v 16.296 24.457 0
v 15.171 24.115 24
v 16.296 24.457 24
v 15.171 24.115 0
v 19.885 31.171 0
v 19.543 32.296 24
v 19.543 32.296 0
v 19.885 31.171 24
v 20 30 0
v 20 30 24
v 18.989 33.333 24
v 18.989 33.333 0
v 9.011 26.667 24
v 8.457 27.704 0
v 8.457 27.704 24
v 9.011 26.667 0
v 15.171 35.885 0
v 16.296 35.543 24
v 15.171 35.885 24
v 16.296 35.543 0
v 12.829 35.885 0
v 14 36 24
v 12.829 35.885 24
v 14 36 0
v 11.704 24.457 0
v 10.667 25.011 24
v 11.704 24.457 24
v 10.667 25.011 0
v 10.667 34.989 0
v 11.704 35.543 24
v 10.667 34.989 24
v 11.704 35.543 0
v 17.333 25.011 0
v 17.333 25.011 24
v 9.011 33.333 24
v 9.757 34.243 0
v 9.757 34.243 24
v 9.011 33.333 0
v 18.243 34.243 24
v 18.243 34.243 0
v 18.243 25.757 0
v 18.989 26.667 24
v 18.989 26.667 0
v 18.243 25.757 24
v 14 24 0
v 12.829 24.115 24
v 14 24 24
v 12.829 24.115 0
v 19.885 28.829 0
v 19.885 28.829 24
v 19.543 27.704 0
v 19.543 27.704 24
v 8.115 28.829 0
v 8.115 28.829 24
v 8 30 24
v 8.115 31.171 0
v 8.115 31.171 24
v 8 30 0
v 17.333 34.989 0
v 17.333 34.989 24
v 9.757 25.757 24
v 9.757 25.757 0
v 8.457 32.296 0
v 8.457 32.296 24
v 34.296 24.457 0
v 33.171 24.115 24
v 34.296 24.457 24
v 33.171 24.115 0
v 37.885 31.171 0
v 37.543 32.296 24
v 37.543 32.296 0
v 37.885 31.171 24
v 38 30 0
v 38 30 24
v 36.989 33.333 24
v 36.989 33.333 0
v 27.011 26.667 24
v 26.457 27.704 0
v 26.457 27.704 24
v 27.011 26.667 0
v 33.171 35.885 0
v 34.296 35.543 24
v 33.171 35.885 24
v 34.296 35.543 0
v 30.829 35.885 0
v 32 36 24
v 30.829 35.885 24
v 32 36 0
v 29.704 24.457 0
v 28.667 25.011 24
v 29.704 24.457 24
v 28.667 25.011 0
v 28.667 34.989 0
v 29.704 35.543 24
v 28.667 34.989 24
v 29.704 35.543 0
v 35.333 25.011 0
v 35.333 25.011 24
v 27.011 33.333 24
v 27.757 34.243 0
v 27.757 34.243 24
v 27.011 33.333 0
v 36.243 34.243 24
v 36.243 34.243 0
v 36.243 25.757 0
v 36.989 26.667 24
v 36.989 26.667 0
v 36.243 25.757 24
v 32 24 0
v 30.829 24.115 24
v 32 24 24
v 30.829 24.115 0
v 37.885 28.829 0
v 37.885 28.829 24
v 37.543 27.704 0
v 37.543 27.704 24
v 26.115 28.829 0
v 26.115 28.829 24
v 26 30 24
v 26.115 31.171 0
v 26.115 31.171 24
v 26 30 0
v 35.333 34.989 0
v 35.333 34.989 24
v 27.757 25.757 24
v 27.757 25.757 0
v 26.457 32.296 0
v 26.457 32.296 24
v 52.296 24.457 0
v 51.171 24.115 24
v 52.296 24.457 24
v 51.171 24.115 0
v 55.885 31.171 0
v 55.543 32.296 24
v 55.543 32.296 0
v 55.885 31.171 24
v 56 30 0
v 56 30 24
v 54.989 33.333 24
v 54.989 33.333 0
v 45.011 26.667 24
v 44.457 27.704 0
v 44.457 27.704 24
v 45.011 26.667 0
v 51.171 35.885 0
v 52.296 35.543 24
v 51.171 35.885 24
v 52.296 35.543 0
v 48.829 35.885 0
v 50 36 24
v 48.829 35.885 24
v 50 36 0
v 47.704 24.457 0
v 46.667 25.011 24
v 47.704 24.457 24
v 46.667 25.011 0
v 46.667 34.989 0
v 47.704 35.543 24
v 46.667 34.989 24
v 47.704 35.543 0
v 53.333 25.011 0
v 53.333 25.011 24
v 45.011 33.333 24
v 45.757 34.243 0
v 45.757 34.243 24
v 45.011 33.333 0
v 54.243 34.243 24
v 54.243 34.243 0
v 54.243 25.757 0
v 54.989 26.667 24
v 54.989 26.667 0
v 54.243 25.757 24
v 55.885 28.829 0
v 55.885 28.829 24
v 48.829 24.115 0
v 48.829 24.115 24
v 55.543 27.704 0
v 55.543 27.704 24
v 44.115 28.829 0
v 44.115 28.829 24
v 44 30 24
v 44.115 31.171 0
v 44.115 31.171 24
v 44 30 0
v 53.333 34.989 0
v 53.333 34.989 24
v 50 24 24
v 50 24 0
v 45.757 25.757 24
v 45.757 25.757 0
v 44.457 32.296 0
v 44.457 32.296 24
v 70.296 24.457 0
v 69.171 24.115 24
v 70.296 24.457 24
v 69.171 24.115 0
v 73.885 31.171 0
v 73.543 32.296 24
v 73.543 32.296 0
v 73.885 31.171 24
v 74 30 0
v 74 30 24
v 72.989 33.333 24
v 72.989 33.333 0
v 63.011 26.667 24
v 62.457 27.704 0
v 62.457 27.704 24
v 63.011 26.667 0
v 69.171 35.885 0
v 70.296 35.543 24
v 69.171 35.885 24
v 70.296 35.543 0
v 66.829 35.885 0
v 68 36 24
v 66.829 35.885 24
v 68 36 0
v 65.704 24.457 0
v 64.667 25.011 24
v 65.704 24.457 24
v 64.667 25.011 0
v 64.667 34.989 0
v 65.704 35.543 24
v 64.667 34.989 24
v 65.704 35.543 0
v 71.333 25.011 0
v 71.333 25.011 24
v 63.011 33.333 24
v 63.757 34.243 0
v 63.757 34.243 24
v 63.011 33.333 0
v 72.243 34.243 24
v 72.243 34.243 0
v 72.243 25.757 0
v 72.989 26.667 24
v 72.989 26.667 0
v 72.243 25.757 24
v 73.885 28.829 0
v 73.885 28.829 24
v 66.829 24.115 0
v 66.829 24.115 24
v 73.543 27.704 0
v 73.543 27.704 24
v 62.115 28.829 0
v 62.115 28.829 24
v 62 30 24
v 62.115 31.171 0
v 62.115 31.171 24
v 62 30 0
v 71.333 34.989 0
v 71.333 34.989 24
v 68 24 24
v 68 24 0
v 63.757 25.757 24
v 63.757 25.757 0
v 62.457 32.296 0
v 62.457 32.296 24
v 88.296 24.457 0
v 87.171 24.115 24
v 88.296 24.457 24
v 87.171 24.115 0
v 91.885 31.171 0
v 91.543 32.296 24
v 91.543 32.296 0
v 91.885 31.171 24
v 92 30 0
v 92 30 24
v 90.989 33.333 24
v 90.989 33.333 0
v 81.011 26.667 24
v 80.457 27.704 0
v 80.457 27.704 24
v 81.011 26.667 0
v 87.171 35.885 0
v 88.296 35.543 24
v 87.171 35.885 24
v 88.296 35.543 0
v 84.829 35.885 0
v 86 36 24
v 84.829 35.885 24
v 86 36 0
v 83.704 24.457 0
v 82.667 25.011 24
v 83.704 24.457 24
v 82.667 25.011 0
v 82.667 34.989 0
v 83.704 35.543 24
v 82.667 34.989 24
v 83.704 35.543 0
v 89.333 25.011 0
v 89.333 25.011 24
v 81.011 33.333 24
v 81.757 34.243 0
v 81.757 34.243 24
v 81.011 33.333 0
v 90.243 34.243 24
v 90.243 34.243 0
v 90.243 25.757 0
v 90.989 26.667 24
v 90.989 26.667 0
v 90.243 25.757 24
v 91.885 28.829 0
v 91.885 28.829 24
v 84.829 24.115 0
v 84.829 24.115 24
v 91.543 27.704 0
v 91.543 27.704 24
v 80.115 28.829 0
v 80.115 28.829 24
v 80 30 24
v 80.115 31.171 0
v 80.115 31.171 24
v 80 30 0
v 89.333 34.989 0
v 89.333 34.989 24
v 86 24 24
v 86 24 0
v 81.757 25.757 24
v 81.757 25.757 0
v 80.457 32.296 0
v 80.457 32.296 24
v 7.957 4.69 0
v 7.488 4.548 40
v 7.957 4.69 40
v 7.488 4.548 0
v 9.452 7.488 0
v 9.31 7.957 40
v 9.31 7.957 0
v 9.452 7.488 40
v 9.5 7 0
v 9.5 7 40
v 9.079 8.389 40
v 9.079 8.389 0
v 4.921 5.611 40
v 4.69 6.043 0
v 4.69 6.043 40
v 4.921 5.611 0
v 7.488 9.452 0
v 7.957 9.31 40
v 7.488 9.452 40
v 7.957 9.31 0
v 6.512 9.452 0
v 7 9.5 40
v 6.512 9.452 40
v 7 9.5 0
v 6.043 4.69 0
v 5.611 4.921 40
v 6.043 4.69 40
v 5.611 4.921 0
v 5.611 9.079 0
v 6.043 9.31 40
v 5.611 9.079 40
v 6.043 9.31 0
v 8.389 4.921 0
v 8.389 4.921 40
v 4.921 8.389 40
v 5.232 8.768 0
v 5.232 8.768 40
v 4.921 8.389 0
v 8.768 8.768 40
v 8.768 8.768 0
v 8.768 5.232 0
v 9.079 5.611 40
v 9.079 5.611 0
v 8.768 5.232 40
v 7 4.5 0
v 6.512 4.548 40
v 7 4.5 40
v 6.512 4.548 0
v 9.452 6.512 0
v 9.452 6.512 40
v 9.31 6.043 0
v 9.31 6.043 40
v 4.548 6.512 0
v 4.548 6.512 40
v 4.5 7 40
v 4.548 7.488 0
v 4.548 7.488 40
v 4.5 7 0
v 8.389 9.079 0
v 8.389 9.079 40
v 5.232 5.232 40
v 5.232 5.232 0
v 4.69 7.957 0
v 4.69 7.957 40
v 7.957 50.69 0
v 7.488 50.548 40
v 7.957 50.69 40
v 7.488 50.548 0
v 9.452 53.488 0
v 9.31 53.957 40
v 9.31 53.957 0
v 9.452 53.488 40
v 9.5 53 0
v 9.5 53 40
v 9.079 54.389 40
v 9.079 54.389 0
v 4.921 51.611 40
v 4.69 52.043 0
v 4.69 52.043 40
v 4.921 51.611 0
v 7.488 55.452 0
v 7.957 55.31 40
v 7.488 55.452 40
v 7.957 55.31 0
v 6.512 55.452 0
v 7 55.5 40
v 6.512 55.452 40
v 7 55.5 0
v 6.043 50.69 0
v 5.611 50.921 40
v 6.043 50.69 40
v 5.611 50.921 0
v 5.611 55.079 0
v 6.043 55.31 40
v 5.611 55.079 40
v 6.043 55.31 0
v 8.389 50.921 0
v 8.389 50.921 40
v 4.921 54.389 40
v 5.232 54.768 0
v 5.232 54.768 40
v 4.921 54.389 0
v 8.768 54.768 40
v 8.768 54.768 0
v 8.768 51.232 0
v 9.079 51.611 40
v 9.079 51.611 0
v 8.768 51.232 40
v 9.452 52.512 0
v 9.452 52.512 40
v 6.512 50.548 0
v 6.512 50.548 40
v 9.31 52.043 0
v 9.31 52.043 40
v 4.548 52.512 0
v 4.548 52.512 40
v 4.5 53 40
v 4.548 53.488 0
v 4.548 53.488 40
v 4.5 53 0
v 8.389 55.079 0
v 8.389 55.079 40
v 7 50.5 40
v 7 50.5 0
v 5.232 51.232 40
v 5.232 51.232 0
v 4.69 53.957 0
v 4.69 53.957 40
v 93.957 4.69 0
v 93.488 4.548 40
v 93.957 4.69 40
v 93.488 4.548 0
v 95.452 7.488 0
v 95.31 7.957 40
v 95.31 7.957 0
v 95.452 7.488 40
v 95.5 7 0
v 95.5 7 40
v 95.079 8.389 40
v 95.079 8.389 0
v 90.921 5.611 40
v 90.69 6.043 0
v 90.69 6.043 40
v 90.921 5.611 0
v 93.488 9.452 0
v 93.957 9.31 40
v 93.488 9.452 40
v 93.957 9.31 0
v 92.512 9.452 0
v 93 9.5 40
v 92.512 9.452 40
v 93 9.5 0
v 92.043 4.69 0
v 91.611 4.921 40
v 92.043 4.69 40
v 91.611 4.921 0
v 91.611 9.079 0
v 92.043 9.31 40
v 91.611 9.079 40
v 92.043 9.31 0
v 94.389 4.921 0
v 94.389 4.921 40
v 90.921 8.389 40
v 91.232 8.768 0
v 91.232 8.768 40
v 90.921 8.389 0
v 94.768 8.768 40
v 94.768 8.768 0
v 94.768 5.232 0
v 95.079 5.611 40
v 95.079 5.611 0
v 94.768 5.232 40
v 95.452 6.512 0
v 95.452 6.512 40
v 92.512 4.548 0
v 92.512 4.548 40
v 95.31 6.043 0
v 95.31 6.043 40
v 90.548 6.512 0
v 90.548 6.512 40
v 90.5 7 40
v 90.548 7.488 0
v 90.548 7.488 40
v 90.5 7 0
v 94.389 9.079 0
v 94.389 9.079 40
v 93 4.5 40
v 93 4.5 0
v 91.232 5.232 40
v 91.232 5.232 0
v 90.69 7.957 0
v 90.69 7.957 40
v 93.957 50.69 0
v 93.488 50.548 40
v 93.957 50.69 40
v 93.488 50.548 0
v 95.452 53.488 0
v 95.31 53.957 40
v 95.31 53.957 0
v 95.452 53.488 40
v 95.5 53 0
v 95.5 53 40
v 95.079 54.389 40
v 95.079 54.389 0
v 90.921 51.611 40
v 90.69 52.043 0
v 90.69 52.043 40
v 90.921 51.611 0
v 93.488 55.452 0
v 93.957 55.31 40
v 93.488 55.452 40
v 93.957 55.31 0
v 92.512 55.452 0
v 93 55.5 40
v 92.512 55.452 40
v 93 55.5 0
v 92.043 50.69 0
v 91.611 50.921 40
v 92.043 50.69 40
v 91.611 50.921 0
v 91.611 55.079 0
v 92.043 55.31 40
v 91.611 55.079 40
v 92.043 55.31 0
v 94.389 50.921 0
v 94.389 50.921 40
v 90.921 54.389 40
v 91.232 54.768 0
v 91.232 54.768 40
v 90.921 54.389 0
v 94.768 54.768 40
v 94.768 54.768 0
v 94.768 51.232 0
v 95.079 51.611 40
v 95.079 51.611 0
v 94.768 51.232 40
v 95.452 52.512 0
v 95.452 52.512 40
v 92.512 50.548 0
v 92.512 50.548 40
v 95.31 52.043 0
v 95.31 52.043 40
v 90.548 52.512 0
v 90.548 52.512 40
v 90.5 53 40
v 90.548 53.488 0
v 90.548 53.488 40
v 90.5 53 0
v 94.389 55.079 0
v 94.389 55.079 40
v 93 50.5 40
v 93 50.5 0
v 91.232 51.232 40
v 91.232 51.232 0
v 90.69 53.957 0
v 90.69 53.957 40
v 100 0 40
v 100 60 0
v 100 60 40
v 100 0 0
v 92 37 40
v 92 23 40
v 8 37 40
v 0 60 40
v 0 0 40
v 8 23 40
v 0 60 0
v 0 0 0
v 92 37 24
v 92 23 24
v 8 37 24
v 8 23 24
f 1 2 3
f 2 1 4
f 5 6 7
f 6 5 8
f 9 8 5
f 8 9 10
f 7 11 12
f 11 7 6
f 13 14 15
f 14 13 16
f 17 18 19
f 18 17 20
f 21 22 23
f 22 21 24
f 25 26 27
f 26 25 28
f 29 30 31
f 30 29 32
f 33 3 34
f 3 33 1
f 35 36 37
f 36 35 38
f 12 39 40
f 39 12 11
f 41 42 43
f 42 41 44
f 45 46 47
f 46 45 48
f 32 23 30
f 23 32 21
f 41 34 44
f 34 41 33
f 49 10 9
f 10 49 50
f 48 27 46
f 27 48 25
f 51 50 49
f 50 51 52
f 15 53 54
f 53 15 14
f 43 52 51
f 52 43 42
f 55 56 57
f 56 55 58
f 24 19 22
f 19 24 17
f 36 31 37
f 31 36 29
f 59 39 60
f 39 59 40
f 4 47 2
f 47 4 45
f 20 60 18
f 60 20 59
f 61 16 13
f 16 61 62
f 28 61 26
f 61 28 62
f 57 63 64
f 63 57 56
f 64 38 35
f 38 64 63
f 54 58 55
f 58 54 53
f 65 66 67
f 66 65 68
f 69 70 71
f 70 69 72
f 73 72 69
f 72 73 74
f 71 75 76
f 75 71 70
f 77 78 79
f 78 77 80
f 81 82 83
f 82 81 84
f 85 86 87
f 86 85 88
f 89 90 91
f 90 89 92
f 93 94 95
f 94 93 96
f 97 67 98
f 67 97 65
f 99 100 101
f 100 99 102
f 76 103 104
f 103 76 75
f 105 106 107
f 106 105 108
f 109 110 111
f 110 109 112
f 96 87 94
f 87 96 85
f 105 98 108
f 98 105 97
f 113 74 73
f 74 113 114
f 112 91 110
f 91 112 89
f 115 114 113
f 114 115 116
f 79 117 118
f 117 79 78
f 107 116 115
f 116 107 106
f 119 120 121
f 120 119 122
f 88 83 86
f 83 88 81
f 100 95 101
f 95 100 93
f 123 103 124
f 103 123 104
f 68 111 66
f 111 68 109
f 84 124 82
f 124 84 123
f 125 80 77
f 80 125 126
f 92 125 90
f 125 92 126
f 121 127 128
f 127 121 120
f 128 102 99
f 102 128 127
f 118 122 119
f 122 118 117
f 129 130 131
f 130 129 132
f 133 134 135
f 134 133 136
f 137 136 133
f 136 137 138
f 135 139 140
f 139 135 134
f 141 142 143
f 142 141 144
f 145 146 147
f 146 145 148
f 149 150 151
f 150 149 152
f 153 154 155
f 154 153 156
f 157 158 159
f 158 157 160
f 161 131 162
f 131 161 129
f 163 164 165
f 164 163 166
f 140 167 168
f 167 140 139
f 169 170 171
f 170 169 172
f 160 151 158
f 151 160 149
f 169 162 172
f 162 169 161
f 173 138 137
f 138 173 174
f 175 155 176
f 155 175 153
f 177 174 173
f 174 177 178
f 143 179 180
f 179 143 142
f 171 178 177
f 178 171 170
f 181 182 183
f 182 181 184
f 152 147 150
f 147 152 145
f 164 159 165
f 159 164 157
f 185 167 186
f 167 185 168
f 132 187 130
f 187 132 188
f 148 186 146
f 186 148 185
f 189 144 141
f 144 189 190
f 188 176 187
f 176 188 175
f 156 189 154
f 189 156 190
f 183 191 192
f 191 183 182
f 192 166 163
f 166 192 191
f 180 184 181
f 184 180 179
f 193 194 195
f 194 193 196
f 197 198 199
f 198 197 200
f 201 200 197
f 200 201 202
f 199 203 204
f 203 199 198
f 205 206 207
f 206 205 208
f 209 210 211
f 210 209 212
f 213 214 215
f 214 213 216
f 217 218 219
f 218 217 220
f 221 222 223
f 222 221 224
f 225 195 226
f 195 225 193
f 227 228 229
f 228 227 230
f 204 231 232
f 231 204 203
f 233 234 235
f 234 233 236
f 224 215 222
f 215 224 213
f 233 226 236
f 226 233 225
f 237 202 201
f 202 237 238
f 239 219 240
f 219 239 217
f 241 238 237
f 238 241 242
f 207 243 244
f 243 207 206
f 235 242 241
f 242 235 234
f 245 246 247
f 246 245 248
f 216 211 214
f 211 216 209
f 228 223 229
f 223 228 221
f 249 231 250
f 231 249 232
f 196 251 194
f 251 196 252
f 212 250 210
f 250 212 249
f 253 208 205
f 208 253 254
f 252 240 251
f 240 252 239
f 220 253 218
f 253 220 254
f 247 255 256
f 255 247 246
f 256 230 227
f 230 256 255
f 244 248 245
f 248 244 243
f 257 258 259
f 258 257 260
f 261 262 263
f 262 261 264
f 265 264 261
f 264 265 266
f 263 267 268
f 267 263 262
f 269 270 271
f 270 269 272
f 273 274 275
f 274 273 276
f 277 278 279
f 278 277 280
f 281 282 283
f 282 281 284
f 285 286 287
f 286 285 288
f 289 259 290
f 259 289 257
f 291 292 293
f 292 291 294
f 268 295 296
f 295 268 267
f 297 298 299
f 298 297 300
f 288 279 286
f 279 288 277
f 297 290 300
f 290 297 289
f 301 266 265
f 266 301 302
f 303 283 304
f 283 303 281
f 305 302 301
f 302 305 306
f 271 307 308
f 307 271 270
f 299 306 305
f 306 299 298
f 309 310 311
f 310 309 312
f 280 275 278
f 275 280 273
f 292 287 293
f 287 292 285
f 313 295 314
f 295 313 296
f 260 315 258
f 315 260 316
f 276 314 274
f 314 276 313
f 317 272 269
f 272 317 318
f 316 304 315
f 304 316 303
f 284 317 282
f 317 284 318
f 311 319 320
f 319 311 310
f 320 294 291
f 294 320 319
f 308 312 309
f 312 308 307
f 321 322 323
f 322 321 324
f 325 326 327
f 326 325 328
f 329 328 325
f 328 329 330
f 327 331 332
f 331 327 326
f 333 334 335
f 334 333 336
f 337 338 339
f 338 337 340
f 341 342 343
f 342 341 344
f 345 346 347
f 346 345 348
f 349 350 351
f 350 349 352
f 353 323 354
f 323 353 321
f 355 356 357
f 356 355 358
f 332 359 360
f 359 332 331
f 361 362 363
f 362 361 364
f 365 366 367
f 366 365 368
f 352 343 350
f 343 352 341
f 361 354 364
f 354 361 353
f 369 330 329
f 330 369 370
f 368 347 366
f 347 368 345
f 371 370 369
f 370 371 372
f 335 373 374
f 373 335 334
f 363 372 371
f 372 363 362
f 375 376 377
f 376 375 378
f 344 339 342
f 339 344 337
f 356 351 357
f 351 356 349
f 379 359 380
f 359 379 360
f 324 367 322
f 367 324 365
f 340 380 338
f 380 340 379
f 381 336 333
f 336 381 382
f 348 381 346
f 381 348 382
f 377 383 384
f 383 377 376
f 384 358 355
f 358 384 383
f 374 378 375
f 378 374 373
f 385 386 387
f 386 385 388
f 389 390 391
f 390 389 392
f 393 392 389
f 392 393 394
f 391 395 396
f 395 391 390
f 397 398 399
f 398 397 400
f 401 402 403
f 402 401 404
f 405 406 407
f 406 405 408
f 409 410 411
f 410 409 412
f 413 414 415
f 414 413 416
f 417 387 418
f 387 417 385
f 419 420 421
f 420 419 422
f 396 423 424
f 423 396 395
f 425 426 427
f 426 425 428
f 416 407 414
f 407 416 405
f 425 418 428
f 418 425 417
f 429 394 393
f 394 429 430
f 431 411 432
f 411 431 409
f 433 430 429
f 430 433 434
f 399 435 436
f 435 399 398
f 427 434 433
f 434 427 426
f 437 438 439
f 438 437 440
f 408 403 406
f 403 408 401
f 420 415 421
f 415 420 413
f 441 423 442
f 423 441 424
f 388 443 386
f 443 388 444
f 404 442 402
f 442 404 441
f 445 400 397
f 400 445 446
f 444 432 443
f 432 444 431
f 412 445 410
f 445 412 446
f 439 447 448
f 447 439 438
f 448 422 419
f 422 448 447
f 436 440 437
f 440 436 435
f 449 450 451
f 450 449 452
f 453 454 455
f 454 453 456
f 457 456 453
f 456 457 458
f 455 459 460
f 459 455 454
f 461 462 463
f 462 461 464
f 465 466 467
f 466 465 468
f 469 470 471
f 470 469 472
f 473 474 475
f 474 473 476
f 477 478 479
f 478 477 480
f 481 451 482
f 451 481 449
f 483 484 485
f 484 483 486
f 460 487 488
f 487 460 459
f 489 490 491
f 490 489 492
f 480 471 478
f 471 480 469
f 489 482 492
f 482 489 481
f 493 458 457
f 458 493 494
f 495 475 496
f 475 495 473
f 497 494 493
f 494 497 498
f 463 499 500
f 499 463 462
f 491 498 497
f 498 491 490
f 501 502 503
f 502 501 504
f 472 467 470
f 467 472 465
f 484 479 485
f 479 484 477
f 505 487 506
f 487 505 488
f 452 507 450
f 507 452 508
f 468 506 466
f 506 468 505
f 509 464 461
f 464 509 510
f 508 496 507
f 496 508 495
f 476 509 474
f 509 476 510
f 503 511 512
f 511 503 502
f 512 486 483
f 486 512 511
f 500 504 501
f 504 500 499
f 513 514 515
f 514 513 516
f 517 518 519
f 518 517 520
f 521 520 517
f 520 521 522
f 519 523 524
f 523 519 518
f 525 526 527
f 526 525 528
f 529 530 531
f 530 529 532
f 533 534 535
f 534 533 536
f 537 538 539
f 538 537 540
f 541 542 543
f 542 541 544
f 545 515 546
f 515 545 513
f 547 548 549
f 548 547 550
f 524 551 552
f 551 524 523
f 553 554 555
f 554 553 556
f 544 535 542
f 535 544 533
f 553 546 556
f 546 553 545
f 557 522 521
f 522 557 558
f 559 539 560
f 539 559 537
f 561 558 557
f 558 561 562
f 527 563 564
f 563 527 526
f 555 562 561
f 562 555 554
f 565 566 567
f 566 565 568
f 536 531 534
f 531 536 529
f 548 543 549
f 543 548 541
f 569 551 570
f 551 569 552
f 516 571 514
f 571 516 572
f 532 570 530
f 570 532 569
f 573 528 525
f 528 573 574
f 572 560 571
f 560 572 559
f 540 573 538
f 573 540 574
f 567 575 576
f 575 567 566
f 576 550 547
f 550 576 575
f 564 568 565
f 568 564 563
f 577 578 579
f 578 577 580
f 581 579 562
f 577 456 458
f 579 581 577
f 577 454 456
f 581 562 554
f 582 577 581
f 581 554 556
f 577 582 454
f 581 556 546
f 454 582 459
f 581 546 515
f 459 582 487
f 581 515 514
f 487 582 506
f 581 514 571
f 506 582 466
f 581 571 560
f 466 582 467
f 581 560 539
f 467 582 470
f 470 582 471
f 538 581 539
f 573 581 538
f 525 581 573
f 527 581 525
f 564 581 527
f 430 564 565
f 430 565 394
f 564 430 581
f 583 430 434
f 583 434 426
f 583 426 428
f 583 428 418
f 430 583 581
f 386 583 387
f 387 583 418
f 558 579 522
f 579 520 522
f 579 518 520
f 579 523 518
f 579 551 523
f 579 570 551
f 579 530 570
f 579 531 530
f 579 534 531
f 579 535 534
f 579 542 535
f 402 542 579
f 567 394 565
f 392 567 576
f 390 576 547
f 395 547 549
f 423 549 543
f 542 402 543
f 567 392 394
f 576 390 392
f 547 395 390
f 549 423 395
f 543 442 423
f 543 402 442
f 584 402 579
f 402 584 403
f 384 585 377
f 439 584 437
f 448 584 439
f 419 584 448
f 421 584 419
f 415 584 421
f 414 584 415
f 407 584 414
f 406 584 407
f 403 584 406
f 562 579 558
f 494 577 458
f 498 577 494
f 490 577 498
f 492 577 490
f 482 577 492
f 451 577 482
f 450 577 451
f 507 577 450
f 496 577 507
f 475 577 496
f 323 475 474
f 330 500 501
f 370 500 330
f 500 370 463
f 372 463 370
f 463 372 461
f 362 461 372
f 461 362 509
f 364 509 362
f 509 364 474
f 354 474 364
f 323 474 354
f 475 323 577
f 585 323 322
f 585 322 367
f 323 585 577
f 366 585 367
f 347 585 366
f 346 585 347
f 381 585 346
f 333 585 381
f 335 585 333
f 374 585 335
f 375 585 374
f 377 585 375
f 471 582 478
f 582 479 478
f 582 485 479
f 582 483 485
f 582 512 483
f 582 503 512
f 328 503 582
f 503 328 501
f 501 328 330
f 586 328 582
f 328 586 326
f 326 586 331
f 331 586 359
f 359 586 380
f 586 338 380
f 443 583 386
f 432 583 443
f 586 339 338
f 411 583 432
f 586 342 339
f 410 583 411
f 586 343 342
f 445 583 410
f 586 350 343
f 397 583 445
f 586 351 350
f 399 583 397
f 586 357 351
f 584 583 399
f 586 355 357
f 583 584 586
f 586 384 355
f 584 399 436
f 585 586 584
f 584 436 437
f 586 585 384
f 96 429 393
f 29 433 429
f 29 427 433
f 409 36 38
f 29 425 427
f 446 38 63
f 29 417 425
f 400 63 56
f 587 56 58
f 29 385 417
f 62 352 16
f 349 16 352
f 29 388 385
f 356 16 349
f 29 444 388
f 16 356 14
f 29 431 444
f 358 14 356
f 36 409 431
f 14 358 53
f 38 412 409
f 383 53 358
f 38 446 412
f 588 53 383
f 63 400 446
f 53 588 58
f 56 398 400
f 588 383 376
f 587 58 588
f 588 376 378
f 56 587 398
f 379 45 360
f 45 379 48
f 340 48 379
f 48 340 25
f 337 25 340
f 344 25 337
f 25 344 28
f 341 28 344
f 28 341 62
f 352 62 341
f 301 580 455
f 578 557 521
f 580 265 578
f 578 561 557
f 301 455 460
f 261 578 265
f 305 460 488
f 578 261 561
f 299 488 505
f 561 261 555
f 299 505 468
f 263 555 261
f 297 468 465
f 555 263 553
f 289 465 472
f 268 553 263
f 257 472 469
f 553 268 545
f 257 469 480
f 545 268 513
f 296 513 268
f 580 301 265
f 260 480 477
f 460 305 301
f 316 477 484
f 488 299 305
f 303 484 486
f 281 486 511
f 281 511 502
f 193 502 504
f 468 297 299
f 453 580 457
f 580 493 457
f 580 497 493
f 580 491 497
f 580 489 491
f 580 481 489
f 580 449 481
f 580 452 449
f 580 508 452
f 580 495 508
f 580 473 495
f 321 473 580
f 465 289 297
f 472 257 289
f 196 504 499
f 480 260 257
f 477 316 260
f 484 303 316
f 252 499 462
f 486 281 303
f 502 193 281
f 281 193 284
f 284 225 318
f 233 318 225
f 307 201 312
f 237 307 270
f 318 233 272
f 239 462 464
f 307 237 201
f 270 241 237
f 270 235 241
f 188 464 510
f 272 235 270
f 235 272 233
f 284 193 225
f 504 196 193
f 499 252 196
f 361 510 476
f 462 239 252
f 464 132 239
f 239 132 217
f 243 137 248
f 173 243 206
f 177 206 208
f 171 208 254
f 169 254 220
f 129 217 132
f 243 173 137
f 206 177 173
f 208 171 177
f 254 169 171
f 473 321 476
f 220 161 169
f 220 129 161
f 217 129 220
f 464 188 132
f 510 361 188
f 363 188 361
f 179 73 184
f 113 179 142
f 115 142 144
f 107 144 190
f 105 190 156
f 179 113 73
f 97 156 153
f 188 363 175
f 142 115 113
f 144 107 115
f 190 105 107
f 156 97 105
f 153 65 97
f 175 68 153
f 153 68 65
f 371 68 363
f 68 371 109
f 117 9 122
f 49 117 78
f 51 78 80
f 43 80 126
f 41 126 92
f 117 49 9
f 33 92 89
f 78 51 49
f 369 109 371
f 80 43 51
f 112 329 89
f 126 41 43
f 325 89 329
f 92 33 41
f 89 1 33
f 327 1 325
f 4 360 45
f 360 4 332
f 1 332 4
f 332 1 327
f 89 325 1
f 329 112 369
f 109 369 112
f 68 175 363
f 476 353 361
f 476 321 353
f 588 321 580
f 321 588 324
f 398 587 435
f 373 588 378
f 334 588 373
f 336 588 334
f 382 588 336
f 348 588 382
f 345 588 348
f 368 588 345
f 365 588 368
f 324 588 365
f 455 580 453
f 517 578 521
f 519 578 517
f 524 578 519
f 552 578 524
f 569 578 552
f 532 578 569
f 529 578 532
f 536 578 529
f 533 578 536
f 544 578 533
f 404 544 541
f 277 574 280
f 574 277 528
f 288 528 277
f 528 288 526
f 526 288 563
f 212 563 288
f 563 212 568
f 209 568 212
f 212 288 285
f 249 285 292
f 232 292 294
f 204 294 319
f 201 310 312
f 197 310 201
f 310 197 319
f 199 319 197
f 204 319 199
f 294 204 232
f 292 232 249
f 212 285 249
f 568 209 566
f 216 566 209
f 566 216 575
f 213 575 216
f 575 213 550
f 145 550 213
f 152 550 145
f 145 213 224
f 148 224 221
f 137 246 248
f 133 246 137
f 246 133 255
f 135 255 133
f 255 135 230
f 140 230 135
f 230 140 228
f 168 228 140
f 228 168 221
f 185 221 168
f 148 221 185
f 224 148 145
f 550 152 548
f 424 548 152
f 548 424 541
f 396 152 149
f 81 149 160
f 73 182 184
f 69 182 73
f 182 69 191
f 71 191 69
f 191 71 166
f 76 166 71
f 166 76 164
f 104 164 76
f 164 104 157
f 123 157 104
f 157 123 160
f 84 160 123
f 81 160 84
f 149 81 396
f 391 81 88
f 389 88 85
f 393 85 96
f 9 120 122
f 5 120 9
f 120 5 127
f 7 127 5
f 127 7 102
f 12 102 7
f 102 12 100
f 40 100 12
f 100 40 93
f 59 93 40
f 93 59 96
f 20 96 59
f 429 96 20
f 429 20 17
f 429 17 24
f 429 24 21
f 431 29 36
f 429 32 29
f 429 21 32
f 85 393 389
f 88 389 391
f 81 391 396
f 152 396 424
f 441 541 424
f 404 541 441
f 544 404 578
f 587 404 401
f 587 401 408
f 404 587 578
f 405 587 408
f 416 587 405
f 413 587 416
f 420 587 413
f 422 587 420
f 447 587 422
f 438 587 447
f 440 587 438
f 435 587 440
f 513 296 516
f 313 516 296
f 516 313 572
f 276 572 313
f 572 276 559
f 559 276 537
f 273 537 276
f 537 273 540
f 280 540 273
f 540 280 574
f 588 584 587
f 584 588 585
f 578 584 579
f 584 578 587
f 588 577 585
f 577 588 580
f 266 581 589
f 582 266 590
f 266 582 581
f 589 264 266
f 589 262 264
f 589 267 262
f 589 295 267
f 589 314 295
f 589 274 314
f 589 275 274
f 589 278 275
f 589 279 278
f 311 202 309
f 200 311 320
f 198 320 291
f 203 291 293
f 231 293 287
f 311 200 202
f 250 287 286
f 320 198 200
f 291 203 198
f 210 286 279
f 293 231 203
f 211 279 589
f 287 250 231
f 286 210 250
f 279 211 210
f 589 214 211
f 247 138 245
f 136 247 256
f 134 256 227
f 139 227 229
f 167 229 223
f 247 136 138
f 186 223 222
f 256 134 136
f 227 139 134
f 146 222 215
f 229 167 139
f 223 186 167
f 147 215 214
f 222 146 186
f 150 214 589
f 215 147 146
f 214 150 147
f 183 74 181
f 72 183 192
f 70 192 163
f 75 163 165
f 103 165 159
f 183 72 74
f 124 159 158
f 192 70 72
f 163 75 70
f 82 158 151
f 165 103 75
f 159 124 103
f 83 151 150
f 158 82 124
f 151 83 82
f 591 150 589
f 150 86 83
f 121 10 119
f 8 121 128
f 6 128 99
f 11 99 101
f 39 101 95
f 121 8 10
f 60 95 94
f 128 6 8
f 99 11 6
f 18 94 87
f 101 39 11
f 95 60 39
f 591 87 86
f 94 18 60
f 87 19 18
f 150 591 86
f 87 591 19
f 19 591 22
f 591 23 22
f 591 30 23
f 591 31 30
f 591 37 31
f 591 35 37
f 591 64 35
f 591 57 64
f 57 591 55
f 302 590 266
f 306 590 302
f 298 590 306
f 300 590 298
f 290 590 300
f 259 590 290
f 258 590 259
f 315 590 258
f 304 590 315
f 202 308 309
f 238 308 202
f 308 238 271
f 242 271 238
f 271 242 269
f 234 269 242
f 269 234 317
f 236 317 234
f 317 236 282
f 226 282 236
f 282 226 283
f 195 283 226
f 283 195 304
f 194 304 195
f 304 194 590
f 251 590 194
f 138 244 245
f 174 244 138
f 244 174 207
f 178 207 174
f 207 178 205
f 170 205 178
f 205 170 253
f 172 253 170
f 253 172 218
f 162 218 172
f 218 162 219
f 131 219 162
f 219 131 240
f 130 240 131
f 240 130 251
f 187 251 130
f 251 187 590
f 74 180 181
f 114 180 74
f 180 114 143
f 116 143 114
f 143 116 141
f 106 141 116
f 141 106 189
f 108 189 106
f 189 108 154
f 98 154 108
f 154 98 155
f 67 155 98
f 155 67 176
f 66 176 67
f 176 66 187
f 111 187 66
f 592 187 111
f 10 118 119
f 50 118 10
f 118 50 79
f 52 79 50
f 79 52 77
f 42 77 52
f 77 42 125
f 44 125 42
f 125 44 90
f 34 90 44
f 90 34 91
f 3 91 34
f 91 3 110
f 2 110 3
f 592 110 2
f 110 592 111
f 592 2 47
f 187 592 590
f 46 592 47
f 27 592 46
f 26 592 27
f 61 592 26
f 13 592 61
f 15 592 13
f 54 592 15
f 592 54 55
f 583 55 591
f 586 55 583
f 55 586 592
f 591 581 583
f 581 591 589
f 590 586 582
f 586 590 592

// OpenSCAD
$fn = 32;

// ----------------------------------------------------------------------
// Manifold block: gallery_top manifold
// ----------------------------------------------------------------------

// --- parameters (mm) ---
block_l = 100;            // block length, X
block_w = 60;             // block width, Y
block_h = 40;             // block height, Z
port_d = 12;              // port bore diameter
port_pitch = 18;          // port pitch along X
gallery_d = 14;           // top gallery width, Y
gallery_depth = 16;       // gallery pocket depth
wall_p = 8;               // gallery end wall thickness, X
mnt_d = 5;                // mounting hole diameter
mnt_in = 7;               // mounting hole inset from the edges
fit_tol = 0.05;           // tolerance for press fits, mm
free_tol = 0.3;           // tolerance for clearance fits, mm

n_ports = 5;  // ports in the row
port_x0 = (block_l - (n_ports - 1) * port_pitch) / 2;  // first port X

difference() {
  cube([block_l, block_w, block_h]);
  for (i = [0 : n_ports - 1])
    translate([port_x0 + i * port_pitch, block_w / 2, -1])
      cylinder(h = block_h + 2, d = port_d);
  translate([wall_p, block_w / 2 - gallery_d / 2, block_h - gallery_depth])
    cube([block_l - 2 * wall_p, gallery_d, gallery_depth + 1]);
  for (cx = [mnt_in, block_l - mnt_in])
    for (cy = [mnt_in, block_w - mnt_in])
      translate([cx, cy, -1]) cylinder(h = block_h + 2, d = mnt_d);
}
